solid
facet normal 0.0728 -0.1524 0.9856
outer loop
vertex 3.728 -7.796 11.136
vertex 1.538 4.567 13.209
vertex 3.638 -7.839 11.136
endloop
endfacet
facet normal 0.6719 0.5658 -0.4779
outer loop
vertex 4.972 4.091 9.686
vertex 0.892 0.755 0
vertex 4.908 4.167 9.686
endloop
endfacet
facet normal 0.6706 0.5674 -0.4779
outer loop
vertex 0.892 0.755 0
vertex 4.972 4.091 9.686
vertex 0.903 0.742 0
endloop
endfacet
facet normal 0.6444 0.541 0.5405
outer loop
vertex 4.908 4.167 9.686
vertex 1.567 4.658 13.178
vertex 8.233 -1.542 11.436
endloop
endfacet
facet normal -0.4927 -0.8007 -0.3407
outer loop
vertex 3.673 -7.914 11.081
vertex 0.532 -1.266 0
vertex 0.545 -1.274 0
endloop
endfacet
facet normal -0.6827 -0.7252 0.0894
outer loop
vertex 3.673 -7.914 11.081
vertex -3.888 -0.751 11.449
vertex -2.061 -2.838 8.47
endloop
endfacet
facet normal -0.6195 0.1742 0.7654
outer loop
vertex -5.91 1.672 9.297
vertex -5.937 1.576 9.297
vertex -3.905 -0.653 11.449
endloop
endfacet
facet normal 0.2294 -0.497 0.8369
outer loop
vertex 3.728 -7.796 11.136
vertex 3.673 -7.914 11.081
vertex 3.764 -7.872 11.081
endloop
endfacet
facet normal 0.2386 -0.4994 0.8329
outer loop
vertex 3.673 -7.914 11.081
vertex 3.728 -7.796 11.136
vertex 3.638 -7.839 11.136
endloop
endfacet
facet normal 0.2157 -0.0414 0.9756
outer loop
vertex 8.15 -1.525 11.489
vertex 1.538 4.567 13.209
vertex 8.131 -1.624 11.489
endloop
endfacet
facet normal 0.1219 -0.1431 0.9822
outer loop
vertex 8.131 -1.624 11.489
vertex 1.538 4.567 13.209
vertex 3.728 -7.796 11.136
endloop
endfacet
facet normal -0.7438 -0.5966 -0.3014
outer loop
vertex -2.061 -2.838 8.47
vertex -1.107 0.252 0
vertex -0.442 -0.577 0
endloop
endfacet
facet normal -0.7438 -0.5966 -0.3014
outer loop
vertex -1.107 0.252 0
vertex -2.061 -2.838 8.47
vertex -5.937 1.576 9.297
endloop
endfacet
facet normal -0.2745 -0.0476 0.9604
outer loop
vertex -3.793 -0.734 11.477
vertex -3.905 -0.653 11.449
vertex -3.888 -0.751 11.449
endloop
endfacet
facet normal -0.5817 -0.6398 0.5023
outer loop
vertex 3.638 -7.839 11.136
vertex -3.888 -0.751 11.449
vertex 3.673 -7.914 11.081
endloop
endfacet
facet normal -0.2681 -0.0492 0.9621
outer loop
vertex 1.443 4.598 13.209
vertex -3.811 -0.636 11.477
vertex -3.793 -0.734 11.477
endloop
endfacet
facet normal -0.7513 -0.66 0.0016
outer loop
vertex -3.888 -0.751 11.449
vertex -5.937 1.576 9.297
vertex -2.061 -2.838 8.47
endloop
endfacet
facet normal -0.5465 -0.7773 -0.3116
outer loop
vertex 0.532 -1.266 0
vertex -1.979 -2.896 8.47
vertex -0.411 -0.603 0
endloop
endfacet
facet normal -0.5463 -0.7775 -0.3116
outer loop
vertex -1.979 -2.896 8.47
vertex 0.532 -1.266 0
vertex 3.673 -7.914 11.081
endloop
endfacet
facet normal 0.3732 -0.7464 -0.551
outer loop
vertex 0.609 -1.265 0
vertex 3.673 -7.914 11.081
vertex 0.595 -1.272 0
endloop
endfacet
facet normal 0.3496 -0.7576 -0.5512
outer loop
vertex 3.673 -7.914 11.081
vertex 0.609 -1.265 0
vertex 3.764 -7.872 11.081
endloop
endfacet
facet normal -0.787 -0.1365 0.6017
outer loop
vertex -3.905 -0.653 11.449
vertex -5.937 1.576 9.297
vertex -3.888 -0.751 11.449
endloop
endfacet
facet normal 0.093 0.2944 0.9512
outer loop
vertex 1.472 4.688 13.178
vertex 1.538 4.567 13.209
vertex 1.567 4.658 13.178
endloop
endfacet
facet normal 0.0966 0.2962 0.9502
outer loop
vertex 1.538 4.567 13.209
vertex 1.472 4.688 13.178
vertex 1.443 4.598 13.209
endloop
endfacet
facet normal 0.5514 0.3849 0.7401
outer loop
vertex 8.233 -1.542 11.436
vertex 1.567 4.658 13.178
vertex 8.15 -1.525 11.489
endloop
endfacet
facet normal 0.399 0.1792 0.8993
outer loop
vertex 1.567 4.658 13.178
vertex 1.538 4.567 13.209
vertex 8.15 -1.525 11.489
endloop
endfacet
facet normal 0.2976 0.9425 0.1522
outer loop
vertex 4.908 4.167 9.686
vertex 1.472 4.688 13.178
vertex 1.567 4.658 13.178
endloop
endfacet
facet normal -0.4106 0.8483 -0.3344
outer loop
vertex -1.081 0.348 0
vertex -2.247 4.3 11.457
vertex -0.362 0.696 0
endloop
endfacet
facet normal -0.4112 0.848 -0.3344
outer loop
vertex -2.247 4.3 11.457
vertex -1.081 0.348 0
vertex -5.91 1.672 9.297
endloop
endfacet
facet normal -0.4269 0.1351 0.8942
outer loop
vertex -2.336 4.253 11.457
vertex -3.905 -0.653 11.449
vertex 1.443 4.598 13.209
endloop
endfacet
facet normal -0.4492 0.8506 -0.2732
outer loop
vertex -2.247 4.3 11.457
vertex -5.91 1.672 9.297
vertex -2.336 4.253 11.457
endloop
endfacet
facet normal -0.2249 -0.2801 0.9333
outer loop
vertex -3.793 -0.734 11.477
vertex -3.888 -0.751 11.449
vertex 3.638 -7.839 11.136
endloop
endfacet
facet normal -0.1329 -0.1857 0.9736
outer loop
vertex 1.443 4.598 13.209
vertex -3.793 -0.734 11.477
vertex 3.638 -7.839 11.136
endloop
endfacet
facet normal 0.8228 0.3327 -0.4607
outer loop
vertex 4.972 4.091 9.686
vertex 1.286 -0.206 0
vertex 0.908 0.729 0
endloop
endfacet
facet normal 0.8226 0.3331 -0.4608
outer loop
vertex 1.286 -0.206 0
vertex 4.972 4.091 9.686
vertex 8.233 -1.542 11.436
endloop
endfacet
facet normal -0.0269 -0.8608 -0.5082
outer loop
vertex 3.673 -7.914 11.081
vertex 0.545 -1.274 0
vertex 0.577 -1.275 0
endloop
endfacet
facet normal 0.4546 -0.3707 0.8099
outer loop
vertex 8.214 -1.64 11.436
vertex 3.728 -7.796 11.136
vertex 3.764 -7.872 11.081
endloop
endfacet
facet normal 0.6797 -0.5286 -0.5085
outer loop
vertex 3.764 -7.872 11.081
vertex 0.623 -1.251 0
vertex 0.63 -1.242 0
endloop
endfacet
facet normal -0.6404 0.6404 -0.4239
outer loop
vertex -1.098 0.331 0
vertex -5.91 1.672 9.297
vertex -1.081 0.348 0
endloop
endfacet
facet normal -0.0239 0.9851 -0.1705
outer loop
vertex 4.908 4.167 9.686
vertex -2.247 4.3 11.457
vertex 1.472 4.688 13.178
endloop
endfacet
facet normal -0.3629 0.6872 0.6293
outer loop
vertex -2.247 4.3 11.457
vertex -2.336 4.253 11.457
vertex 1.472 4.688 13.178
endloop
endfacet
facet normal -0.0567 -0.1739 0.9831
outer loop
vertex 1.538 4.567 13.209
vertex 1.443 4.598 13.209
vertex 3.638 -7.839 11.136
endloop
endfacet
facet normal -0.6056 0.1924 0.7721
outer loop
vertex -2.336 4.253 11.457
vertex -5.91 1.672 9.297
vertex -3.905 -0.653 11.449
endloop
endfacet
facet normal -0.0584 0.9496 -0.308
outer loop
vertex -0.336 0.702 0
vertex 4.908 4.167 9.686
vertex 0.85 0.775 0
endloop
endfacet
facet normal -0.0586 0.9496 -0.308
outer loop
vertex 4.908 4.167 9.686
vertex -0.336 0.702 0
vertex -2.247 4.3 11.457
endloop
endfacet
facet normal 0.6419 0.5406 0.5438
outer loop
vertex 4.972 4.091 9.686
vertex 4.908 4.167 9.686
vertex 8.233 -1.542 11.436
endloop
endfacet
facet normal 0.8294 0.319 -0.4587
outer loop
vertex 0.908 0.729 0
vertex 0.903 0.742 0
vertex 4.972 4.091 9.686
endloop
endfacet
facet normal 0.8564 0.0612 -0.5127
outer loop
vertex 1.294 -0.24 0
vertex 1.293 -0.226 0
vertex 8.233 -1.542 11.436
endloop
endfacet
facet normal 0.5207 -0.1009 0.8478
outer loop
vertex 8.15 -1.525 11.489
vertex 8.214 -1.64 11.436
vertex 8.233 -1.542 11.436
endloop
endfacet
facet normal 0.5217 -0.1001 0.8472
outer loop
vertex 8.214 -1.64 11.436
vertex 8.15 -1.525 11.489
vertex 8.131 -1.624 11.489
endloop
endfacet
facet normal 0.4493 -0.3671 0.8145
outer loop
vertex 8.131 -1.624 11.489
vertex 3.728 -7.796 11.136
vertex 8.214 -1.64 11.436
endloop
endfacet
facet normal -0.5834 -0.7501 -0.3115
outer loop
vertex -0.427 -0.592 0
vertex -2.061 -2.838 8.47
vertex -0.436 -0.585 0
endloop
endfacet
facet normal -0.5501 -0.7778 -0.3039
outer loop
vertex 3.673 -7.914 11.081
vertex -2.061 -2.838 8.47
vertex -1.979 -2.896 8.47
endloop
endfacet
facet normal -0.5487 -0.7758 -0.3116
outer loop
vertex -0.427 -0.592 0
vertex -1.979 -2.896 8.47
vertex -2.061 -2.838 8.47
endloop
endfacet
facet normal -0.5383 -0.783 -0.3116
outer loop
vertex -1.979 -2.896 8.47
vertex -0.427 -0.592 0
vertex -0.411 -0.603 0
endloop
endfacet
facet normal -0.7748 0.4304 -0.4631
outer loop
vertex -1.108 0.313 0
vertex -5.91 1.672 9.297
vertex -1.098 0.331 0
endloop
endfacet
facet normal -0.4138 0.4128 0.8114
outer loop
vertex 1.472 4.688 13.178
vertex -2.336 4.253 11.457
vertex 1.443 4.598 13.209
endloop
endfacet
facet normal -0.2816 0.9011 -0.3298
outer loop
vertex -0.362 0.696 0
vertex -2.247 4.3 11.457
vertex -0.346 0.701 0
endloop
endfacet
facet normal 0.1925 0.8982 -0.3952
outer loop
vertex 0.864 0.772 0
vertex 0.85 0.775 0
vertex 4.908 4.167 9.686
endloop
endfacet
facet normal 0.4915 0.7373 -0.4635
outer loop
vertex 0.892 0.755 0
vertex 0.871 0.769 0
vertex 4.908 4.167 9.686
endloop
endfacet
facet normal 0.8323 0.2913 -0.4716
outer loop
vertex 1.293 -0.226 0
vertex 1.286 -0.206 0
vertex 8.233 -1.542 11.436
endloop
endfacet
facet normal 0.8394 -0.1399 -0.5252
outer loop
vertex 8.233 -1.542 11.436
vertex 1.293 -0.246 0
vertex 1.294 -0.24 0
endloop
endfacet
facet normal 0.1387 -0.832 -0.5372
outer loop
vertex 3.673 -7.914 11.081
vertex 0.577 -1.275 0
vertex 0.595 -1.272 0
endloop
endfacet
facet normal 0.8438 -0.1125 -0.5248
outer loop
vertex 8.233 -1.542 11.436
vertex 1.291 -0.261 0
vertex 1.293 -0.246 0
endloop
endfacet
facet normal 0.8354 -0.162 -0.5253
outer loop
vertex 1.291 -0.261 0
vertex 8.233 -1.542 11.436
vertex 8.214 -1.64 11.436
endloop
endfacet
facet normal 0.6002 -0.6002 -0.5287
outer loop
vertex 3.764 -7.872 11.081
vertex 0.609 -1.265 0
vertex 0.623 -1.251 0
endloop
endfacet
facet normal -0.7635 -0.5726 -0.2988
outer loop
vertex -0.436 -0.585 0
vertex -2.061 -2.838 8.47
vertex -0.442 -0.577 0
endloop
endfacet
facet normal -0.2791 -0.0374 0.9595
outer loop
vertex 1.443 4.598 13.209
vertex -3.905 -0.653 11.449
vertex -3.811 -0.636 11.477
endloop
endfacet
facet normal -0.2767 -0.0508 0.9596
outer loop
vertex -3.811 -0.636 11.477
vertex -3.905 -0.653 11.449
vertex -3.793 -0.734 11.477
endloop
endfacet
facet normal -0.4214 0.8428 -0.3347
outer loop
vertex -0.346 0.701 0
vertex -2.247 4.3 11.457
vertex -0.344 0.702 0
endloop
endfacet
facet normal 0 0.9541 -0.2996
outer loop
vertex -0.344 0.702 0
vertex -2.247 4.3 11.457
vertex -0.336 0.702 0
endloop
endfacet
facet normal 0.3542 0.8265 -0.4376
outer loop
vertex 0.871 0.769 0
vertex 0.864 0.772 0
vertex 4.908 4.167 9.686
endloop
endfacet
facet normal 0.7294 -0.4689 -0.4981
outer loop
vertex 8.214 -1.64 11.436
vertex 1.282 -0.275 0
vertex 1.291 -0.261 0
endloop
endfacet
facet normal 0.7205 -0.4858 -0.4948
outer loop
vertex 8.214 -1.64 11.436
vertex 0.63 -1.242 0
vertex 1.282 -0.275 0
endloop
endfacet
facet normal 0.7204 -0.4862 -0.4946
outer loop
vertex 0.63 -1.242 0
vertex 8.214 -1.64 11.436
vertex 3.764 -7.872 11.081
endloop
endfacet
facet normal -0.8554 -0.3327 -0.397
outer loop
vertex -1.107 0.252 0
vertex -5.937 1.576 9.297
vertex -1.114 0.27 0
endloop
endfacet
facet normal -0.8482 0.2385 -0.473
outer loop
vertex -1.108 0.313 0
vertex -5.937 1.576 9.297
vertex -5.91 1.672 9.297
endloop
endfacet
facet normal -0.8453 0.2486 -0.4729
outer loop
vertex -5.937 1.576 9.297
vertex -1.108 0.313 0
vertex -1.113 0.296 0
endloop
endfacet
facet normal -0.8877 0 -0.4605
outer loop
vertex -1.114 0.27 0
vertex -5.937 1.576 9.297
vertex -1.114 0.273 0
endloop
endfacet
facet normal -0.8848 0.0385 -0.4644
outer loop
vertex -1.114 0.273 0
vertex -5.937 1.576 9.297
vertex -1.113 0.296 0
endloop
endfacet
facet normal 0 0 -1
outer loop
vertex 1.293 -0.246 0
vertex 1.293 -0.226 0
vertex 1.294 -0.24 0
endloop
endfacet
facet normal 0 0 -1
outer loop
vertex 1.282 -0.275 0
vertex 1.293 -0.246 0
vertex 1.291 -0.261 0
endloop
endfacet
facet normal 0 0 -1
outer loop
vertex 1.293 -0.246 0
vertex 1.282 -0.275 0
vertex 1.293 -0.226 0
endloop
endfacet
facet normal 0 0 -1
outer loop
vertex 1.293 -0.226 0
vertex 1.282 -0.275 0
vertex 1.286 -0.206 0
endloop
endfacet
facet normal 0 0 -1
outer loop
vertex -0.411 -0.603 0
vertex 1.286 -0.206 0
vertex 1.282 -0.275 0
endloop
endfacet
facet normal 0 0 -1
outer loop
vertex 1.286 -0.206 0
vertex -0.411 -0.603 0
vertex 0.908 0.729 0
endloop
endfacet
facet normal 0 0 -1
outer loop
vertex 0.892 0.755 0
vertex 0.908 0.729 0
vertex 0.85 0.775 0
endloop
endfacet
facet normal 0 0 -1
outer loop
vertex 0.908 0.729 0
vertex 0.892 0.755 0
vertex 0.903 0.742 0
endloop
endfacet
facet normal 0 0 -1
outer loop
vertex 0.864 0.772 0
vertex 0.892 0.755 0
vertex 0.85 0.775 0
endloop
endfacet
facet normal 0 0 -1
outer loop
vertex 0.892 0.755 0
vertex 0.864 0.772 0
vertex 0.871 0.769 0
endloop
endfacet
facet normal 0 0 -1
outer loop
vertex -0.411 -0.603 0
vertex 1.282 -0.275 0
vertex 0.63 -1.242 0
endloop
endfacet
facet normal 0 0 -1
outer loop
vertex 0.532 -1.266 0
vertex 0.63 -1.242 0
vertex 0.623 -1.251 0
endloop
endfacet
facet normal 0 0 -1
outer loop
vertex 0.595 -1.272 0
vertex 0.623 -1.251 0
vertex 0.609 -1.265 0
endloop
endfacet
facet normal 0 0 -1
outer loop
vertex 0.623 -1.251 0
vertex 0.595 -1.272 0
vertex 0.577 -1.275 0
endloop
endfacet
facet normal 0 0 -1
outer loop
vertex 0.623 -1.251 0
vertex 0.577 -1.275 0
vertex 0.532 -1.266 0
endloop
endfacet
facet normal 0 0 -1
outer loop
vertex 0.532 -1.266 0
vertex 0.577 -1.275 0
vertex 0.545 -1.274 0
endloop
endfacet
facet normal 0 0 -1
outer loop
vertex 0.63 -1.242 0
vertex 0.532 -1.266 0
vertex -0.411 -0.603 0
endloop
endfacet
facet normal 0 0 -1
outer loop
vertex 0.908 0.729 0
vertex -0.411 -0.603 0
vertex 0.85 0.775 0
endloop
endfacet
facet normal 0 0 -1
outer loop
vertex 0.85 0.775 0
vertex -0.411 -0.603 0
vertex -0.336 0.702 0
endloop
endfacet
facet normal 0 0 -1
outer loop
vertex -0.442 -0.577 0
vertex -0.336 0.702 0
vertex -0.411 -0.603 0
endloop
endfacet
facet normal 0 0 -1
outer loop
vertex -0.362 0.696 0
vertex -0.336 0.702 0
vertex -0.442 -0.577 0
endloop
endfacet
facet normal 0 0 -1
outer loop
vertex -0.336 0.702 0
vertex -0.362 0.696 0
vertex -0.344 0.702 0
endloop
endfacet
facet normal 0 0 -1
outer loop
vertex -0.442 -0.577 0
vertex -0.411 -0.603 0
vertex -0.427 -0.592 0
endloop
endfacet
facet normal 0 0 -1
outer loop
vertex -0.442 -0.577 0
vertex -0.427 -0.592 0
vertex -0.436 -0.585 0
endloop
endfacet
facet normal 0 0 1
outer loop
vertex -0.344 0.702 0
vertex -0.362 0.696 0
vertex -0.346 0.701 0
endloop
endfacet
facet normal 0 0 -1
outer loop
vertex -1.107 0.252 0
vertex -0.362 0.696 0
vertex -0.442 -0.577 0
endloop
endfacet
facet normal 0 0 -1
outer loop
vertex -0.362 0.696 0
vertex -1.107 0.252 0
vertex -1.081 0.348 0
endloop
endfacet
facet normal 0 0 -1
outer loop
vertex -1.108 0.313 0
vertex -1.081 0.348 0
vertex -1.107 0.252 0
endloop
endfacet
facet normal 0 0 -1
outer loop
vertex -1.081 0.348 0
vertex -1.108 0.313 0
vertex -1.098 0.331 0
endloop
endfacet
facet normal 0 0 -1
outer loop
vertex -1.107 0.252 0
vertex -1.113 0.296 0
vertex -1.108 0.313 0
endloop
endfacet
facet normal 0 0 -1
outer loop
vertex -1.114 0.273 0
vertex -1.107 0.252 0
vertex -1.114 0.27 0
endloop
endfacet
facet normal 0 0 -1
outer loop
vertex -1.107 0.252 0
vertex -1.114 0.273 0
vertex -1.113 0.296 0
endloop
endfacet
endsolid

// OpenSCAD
difference(){
color("#006600")translate([0,0,-2]) hull()
for([0:15])
    rotate([rands(5,35,1)[0],0,rands(0,360,1)[0]]){
        hight = rands(8,16,1)[0];
        translate([0,0,hight/2])
            cube([0.1,0.1,hight], center = true);
    };
    translate([0,0,-10])cylinder(h = 10, r = 10, center = false);
    
}
